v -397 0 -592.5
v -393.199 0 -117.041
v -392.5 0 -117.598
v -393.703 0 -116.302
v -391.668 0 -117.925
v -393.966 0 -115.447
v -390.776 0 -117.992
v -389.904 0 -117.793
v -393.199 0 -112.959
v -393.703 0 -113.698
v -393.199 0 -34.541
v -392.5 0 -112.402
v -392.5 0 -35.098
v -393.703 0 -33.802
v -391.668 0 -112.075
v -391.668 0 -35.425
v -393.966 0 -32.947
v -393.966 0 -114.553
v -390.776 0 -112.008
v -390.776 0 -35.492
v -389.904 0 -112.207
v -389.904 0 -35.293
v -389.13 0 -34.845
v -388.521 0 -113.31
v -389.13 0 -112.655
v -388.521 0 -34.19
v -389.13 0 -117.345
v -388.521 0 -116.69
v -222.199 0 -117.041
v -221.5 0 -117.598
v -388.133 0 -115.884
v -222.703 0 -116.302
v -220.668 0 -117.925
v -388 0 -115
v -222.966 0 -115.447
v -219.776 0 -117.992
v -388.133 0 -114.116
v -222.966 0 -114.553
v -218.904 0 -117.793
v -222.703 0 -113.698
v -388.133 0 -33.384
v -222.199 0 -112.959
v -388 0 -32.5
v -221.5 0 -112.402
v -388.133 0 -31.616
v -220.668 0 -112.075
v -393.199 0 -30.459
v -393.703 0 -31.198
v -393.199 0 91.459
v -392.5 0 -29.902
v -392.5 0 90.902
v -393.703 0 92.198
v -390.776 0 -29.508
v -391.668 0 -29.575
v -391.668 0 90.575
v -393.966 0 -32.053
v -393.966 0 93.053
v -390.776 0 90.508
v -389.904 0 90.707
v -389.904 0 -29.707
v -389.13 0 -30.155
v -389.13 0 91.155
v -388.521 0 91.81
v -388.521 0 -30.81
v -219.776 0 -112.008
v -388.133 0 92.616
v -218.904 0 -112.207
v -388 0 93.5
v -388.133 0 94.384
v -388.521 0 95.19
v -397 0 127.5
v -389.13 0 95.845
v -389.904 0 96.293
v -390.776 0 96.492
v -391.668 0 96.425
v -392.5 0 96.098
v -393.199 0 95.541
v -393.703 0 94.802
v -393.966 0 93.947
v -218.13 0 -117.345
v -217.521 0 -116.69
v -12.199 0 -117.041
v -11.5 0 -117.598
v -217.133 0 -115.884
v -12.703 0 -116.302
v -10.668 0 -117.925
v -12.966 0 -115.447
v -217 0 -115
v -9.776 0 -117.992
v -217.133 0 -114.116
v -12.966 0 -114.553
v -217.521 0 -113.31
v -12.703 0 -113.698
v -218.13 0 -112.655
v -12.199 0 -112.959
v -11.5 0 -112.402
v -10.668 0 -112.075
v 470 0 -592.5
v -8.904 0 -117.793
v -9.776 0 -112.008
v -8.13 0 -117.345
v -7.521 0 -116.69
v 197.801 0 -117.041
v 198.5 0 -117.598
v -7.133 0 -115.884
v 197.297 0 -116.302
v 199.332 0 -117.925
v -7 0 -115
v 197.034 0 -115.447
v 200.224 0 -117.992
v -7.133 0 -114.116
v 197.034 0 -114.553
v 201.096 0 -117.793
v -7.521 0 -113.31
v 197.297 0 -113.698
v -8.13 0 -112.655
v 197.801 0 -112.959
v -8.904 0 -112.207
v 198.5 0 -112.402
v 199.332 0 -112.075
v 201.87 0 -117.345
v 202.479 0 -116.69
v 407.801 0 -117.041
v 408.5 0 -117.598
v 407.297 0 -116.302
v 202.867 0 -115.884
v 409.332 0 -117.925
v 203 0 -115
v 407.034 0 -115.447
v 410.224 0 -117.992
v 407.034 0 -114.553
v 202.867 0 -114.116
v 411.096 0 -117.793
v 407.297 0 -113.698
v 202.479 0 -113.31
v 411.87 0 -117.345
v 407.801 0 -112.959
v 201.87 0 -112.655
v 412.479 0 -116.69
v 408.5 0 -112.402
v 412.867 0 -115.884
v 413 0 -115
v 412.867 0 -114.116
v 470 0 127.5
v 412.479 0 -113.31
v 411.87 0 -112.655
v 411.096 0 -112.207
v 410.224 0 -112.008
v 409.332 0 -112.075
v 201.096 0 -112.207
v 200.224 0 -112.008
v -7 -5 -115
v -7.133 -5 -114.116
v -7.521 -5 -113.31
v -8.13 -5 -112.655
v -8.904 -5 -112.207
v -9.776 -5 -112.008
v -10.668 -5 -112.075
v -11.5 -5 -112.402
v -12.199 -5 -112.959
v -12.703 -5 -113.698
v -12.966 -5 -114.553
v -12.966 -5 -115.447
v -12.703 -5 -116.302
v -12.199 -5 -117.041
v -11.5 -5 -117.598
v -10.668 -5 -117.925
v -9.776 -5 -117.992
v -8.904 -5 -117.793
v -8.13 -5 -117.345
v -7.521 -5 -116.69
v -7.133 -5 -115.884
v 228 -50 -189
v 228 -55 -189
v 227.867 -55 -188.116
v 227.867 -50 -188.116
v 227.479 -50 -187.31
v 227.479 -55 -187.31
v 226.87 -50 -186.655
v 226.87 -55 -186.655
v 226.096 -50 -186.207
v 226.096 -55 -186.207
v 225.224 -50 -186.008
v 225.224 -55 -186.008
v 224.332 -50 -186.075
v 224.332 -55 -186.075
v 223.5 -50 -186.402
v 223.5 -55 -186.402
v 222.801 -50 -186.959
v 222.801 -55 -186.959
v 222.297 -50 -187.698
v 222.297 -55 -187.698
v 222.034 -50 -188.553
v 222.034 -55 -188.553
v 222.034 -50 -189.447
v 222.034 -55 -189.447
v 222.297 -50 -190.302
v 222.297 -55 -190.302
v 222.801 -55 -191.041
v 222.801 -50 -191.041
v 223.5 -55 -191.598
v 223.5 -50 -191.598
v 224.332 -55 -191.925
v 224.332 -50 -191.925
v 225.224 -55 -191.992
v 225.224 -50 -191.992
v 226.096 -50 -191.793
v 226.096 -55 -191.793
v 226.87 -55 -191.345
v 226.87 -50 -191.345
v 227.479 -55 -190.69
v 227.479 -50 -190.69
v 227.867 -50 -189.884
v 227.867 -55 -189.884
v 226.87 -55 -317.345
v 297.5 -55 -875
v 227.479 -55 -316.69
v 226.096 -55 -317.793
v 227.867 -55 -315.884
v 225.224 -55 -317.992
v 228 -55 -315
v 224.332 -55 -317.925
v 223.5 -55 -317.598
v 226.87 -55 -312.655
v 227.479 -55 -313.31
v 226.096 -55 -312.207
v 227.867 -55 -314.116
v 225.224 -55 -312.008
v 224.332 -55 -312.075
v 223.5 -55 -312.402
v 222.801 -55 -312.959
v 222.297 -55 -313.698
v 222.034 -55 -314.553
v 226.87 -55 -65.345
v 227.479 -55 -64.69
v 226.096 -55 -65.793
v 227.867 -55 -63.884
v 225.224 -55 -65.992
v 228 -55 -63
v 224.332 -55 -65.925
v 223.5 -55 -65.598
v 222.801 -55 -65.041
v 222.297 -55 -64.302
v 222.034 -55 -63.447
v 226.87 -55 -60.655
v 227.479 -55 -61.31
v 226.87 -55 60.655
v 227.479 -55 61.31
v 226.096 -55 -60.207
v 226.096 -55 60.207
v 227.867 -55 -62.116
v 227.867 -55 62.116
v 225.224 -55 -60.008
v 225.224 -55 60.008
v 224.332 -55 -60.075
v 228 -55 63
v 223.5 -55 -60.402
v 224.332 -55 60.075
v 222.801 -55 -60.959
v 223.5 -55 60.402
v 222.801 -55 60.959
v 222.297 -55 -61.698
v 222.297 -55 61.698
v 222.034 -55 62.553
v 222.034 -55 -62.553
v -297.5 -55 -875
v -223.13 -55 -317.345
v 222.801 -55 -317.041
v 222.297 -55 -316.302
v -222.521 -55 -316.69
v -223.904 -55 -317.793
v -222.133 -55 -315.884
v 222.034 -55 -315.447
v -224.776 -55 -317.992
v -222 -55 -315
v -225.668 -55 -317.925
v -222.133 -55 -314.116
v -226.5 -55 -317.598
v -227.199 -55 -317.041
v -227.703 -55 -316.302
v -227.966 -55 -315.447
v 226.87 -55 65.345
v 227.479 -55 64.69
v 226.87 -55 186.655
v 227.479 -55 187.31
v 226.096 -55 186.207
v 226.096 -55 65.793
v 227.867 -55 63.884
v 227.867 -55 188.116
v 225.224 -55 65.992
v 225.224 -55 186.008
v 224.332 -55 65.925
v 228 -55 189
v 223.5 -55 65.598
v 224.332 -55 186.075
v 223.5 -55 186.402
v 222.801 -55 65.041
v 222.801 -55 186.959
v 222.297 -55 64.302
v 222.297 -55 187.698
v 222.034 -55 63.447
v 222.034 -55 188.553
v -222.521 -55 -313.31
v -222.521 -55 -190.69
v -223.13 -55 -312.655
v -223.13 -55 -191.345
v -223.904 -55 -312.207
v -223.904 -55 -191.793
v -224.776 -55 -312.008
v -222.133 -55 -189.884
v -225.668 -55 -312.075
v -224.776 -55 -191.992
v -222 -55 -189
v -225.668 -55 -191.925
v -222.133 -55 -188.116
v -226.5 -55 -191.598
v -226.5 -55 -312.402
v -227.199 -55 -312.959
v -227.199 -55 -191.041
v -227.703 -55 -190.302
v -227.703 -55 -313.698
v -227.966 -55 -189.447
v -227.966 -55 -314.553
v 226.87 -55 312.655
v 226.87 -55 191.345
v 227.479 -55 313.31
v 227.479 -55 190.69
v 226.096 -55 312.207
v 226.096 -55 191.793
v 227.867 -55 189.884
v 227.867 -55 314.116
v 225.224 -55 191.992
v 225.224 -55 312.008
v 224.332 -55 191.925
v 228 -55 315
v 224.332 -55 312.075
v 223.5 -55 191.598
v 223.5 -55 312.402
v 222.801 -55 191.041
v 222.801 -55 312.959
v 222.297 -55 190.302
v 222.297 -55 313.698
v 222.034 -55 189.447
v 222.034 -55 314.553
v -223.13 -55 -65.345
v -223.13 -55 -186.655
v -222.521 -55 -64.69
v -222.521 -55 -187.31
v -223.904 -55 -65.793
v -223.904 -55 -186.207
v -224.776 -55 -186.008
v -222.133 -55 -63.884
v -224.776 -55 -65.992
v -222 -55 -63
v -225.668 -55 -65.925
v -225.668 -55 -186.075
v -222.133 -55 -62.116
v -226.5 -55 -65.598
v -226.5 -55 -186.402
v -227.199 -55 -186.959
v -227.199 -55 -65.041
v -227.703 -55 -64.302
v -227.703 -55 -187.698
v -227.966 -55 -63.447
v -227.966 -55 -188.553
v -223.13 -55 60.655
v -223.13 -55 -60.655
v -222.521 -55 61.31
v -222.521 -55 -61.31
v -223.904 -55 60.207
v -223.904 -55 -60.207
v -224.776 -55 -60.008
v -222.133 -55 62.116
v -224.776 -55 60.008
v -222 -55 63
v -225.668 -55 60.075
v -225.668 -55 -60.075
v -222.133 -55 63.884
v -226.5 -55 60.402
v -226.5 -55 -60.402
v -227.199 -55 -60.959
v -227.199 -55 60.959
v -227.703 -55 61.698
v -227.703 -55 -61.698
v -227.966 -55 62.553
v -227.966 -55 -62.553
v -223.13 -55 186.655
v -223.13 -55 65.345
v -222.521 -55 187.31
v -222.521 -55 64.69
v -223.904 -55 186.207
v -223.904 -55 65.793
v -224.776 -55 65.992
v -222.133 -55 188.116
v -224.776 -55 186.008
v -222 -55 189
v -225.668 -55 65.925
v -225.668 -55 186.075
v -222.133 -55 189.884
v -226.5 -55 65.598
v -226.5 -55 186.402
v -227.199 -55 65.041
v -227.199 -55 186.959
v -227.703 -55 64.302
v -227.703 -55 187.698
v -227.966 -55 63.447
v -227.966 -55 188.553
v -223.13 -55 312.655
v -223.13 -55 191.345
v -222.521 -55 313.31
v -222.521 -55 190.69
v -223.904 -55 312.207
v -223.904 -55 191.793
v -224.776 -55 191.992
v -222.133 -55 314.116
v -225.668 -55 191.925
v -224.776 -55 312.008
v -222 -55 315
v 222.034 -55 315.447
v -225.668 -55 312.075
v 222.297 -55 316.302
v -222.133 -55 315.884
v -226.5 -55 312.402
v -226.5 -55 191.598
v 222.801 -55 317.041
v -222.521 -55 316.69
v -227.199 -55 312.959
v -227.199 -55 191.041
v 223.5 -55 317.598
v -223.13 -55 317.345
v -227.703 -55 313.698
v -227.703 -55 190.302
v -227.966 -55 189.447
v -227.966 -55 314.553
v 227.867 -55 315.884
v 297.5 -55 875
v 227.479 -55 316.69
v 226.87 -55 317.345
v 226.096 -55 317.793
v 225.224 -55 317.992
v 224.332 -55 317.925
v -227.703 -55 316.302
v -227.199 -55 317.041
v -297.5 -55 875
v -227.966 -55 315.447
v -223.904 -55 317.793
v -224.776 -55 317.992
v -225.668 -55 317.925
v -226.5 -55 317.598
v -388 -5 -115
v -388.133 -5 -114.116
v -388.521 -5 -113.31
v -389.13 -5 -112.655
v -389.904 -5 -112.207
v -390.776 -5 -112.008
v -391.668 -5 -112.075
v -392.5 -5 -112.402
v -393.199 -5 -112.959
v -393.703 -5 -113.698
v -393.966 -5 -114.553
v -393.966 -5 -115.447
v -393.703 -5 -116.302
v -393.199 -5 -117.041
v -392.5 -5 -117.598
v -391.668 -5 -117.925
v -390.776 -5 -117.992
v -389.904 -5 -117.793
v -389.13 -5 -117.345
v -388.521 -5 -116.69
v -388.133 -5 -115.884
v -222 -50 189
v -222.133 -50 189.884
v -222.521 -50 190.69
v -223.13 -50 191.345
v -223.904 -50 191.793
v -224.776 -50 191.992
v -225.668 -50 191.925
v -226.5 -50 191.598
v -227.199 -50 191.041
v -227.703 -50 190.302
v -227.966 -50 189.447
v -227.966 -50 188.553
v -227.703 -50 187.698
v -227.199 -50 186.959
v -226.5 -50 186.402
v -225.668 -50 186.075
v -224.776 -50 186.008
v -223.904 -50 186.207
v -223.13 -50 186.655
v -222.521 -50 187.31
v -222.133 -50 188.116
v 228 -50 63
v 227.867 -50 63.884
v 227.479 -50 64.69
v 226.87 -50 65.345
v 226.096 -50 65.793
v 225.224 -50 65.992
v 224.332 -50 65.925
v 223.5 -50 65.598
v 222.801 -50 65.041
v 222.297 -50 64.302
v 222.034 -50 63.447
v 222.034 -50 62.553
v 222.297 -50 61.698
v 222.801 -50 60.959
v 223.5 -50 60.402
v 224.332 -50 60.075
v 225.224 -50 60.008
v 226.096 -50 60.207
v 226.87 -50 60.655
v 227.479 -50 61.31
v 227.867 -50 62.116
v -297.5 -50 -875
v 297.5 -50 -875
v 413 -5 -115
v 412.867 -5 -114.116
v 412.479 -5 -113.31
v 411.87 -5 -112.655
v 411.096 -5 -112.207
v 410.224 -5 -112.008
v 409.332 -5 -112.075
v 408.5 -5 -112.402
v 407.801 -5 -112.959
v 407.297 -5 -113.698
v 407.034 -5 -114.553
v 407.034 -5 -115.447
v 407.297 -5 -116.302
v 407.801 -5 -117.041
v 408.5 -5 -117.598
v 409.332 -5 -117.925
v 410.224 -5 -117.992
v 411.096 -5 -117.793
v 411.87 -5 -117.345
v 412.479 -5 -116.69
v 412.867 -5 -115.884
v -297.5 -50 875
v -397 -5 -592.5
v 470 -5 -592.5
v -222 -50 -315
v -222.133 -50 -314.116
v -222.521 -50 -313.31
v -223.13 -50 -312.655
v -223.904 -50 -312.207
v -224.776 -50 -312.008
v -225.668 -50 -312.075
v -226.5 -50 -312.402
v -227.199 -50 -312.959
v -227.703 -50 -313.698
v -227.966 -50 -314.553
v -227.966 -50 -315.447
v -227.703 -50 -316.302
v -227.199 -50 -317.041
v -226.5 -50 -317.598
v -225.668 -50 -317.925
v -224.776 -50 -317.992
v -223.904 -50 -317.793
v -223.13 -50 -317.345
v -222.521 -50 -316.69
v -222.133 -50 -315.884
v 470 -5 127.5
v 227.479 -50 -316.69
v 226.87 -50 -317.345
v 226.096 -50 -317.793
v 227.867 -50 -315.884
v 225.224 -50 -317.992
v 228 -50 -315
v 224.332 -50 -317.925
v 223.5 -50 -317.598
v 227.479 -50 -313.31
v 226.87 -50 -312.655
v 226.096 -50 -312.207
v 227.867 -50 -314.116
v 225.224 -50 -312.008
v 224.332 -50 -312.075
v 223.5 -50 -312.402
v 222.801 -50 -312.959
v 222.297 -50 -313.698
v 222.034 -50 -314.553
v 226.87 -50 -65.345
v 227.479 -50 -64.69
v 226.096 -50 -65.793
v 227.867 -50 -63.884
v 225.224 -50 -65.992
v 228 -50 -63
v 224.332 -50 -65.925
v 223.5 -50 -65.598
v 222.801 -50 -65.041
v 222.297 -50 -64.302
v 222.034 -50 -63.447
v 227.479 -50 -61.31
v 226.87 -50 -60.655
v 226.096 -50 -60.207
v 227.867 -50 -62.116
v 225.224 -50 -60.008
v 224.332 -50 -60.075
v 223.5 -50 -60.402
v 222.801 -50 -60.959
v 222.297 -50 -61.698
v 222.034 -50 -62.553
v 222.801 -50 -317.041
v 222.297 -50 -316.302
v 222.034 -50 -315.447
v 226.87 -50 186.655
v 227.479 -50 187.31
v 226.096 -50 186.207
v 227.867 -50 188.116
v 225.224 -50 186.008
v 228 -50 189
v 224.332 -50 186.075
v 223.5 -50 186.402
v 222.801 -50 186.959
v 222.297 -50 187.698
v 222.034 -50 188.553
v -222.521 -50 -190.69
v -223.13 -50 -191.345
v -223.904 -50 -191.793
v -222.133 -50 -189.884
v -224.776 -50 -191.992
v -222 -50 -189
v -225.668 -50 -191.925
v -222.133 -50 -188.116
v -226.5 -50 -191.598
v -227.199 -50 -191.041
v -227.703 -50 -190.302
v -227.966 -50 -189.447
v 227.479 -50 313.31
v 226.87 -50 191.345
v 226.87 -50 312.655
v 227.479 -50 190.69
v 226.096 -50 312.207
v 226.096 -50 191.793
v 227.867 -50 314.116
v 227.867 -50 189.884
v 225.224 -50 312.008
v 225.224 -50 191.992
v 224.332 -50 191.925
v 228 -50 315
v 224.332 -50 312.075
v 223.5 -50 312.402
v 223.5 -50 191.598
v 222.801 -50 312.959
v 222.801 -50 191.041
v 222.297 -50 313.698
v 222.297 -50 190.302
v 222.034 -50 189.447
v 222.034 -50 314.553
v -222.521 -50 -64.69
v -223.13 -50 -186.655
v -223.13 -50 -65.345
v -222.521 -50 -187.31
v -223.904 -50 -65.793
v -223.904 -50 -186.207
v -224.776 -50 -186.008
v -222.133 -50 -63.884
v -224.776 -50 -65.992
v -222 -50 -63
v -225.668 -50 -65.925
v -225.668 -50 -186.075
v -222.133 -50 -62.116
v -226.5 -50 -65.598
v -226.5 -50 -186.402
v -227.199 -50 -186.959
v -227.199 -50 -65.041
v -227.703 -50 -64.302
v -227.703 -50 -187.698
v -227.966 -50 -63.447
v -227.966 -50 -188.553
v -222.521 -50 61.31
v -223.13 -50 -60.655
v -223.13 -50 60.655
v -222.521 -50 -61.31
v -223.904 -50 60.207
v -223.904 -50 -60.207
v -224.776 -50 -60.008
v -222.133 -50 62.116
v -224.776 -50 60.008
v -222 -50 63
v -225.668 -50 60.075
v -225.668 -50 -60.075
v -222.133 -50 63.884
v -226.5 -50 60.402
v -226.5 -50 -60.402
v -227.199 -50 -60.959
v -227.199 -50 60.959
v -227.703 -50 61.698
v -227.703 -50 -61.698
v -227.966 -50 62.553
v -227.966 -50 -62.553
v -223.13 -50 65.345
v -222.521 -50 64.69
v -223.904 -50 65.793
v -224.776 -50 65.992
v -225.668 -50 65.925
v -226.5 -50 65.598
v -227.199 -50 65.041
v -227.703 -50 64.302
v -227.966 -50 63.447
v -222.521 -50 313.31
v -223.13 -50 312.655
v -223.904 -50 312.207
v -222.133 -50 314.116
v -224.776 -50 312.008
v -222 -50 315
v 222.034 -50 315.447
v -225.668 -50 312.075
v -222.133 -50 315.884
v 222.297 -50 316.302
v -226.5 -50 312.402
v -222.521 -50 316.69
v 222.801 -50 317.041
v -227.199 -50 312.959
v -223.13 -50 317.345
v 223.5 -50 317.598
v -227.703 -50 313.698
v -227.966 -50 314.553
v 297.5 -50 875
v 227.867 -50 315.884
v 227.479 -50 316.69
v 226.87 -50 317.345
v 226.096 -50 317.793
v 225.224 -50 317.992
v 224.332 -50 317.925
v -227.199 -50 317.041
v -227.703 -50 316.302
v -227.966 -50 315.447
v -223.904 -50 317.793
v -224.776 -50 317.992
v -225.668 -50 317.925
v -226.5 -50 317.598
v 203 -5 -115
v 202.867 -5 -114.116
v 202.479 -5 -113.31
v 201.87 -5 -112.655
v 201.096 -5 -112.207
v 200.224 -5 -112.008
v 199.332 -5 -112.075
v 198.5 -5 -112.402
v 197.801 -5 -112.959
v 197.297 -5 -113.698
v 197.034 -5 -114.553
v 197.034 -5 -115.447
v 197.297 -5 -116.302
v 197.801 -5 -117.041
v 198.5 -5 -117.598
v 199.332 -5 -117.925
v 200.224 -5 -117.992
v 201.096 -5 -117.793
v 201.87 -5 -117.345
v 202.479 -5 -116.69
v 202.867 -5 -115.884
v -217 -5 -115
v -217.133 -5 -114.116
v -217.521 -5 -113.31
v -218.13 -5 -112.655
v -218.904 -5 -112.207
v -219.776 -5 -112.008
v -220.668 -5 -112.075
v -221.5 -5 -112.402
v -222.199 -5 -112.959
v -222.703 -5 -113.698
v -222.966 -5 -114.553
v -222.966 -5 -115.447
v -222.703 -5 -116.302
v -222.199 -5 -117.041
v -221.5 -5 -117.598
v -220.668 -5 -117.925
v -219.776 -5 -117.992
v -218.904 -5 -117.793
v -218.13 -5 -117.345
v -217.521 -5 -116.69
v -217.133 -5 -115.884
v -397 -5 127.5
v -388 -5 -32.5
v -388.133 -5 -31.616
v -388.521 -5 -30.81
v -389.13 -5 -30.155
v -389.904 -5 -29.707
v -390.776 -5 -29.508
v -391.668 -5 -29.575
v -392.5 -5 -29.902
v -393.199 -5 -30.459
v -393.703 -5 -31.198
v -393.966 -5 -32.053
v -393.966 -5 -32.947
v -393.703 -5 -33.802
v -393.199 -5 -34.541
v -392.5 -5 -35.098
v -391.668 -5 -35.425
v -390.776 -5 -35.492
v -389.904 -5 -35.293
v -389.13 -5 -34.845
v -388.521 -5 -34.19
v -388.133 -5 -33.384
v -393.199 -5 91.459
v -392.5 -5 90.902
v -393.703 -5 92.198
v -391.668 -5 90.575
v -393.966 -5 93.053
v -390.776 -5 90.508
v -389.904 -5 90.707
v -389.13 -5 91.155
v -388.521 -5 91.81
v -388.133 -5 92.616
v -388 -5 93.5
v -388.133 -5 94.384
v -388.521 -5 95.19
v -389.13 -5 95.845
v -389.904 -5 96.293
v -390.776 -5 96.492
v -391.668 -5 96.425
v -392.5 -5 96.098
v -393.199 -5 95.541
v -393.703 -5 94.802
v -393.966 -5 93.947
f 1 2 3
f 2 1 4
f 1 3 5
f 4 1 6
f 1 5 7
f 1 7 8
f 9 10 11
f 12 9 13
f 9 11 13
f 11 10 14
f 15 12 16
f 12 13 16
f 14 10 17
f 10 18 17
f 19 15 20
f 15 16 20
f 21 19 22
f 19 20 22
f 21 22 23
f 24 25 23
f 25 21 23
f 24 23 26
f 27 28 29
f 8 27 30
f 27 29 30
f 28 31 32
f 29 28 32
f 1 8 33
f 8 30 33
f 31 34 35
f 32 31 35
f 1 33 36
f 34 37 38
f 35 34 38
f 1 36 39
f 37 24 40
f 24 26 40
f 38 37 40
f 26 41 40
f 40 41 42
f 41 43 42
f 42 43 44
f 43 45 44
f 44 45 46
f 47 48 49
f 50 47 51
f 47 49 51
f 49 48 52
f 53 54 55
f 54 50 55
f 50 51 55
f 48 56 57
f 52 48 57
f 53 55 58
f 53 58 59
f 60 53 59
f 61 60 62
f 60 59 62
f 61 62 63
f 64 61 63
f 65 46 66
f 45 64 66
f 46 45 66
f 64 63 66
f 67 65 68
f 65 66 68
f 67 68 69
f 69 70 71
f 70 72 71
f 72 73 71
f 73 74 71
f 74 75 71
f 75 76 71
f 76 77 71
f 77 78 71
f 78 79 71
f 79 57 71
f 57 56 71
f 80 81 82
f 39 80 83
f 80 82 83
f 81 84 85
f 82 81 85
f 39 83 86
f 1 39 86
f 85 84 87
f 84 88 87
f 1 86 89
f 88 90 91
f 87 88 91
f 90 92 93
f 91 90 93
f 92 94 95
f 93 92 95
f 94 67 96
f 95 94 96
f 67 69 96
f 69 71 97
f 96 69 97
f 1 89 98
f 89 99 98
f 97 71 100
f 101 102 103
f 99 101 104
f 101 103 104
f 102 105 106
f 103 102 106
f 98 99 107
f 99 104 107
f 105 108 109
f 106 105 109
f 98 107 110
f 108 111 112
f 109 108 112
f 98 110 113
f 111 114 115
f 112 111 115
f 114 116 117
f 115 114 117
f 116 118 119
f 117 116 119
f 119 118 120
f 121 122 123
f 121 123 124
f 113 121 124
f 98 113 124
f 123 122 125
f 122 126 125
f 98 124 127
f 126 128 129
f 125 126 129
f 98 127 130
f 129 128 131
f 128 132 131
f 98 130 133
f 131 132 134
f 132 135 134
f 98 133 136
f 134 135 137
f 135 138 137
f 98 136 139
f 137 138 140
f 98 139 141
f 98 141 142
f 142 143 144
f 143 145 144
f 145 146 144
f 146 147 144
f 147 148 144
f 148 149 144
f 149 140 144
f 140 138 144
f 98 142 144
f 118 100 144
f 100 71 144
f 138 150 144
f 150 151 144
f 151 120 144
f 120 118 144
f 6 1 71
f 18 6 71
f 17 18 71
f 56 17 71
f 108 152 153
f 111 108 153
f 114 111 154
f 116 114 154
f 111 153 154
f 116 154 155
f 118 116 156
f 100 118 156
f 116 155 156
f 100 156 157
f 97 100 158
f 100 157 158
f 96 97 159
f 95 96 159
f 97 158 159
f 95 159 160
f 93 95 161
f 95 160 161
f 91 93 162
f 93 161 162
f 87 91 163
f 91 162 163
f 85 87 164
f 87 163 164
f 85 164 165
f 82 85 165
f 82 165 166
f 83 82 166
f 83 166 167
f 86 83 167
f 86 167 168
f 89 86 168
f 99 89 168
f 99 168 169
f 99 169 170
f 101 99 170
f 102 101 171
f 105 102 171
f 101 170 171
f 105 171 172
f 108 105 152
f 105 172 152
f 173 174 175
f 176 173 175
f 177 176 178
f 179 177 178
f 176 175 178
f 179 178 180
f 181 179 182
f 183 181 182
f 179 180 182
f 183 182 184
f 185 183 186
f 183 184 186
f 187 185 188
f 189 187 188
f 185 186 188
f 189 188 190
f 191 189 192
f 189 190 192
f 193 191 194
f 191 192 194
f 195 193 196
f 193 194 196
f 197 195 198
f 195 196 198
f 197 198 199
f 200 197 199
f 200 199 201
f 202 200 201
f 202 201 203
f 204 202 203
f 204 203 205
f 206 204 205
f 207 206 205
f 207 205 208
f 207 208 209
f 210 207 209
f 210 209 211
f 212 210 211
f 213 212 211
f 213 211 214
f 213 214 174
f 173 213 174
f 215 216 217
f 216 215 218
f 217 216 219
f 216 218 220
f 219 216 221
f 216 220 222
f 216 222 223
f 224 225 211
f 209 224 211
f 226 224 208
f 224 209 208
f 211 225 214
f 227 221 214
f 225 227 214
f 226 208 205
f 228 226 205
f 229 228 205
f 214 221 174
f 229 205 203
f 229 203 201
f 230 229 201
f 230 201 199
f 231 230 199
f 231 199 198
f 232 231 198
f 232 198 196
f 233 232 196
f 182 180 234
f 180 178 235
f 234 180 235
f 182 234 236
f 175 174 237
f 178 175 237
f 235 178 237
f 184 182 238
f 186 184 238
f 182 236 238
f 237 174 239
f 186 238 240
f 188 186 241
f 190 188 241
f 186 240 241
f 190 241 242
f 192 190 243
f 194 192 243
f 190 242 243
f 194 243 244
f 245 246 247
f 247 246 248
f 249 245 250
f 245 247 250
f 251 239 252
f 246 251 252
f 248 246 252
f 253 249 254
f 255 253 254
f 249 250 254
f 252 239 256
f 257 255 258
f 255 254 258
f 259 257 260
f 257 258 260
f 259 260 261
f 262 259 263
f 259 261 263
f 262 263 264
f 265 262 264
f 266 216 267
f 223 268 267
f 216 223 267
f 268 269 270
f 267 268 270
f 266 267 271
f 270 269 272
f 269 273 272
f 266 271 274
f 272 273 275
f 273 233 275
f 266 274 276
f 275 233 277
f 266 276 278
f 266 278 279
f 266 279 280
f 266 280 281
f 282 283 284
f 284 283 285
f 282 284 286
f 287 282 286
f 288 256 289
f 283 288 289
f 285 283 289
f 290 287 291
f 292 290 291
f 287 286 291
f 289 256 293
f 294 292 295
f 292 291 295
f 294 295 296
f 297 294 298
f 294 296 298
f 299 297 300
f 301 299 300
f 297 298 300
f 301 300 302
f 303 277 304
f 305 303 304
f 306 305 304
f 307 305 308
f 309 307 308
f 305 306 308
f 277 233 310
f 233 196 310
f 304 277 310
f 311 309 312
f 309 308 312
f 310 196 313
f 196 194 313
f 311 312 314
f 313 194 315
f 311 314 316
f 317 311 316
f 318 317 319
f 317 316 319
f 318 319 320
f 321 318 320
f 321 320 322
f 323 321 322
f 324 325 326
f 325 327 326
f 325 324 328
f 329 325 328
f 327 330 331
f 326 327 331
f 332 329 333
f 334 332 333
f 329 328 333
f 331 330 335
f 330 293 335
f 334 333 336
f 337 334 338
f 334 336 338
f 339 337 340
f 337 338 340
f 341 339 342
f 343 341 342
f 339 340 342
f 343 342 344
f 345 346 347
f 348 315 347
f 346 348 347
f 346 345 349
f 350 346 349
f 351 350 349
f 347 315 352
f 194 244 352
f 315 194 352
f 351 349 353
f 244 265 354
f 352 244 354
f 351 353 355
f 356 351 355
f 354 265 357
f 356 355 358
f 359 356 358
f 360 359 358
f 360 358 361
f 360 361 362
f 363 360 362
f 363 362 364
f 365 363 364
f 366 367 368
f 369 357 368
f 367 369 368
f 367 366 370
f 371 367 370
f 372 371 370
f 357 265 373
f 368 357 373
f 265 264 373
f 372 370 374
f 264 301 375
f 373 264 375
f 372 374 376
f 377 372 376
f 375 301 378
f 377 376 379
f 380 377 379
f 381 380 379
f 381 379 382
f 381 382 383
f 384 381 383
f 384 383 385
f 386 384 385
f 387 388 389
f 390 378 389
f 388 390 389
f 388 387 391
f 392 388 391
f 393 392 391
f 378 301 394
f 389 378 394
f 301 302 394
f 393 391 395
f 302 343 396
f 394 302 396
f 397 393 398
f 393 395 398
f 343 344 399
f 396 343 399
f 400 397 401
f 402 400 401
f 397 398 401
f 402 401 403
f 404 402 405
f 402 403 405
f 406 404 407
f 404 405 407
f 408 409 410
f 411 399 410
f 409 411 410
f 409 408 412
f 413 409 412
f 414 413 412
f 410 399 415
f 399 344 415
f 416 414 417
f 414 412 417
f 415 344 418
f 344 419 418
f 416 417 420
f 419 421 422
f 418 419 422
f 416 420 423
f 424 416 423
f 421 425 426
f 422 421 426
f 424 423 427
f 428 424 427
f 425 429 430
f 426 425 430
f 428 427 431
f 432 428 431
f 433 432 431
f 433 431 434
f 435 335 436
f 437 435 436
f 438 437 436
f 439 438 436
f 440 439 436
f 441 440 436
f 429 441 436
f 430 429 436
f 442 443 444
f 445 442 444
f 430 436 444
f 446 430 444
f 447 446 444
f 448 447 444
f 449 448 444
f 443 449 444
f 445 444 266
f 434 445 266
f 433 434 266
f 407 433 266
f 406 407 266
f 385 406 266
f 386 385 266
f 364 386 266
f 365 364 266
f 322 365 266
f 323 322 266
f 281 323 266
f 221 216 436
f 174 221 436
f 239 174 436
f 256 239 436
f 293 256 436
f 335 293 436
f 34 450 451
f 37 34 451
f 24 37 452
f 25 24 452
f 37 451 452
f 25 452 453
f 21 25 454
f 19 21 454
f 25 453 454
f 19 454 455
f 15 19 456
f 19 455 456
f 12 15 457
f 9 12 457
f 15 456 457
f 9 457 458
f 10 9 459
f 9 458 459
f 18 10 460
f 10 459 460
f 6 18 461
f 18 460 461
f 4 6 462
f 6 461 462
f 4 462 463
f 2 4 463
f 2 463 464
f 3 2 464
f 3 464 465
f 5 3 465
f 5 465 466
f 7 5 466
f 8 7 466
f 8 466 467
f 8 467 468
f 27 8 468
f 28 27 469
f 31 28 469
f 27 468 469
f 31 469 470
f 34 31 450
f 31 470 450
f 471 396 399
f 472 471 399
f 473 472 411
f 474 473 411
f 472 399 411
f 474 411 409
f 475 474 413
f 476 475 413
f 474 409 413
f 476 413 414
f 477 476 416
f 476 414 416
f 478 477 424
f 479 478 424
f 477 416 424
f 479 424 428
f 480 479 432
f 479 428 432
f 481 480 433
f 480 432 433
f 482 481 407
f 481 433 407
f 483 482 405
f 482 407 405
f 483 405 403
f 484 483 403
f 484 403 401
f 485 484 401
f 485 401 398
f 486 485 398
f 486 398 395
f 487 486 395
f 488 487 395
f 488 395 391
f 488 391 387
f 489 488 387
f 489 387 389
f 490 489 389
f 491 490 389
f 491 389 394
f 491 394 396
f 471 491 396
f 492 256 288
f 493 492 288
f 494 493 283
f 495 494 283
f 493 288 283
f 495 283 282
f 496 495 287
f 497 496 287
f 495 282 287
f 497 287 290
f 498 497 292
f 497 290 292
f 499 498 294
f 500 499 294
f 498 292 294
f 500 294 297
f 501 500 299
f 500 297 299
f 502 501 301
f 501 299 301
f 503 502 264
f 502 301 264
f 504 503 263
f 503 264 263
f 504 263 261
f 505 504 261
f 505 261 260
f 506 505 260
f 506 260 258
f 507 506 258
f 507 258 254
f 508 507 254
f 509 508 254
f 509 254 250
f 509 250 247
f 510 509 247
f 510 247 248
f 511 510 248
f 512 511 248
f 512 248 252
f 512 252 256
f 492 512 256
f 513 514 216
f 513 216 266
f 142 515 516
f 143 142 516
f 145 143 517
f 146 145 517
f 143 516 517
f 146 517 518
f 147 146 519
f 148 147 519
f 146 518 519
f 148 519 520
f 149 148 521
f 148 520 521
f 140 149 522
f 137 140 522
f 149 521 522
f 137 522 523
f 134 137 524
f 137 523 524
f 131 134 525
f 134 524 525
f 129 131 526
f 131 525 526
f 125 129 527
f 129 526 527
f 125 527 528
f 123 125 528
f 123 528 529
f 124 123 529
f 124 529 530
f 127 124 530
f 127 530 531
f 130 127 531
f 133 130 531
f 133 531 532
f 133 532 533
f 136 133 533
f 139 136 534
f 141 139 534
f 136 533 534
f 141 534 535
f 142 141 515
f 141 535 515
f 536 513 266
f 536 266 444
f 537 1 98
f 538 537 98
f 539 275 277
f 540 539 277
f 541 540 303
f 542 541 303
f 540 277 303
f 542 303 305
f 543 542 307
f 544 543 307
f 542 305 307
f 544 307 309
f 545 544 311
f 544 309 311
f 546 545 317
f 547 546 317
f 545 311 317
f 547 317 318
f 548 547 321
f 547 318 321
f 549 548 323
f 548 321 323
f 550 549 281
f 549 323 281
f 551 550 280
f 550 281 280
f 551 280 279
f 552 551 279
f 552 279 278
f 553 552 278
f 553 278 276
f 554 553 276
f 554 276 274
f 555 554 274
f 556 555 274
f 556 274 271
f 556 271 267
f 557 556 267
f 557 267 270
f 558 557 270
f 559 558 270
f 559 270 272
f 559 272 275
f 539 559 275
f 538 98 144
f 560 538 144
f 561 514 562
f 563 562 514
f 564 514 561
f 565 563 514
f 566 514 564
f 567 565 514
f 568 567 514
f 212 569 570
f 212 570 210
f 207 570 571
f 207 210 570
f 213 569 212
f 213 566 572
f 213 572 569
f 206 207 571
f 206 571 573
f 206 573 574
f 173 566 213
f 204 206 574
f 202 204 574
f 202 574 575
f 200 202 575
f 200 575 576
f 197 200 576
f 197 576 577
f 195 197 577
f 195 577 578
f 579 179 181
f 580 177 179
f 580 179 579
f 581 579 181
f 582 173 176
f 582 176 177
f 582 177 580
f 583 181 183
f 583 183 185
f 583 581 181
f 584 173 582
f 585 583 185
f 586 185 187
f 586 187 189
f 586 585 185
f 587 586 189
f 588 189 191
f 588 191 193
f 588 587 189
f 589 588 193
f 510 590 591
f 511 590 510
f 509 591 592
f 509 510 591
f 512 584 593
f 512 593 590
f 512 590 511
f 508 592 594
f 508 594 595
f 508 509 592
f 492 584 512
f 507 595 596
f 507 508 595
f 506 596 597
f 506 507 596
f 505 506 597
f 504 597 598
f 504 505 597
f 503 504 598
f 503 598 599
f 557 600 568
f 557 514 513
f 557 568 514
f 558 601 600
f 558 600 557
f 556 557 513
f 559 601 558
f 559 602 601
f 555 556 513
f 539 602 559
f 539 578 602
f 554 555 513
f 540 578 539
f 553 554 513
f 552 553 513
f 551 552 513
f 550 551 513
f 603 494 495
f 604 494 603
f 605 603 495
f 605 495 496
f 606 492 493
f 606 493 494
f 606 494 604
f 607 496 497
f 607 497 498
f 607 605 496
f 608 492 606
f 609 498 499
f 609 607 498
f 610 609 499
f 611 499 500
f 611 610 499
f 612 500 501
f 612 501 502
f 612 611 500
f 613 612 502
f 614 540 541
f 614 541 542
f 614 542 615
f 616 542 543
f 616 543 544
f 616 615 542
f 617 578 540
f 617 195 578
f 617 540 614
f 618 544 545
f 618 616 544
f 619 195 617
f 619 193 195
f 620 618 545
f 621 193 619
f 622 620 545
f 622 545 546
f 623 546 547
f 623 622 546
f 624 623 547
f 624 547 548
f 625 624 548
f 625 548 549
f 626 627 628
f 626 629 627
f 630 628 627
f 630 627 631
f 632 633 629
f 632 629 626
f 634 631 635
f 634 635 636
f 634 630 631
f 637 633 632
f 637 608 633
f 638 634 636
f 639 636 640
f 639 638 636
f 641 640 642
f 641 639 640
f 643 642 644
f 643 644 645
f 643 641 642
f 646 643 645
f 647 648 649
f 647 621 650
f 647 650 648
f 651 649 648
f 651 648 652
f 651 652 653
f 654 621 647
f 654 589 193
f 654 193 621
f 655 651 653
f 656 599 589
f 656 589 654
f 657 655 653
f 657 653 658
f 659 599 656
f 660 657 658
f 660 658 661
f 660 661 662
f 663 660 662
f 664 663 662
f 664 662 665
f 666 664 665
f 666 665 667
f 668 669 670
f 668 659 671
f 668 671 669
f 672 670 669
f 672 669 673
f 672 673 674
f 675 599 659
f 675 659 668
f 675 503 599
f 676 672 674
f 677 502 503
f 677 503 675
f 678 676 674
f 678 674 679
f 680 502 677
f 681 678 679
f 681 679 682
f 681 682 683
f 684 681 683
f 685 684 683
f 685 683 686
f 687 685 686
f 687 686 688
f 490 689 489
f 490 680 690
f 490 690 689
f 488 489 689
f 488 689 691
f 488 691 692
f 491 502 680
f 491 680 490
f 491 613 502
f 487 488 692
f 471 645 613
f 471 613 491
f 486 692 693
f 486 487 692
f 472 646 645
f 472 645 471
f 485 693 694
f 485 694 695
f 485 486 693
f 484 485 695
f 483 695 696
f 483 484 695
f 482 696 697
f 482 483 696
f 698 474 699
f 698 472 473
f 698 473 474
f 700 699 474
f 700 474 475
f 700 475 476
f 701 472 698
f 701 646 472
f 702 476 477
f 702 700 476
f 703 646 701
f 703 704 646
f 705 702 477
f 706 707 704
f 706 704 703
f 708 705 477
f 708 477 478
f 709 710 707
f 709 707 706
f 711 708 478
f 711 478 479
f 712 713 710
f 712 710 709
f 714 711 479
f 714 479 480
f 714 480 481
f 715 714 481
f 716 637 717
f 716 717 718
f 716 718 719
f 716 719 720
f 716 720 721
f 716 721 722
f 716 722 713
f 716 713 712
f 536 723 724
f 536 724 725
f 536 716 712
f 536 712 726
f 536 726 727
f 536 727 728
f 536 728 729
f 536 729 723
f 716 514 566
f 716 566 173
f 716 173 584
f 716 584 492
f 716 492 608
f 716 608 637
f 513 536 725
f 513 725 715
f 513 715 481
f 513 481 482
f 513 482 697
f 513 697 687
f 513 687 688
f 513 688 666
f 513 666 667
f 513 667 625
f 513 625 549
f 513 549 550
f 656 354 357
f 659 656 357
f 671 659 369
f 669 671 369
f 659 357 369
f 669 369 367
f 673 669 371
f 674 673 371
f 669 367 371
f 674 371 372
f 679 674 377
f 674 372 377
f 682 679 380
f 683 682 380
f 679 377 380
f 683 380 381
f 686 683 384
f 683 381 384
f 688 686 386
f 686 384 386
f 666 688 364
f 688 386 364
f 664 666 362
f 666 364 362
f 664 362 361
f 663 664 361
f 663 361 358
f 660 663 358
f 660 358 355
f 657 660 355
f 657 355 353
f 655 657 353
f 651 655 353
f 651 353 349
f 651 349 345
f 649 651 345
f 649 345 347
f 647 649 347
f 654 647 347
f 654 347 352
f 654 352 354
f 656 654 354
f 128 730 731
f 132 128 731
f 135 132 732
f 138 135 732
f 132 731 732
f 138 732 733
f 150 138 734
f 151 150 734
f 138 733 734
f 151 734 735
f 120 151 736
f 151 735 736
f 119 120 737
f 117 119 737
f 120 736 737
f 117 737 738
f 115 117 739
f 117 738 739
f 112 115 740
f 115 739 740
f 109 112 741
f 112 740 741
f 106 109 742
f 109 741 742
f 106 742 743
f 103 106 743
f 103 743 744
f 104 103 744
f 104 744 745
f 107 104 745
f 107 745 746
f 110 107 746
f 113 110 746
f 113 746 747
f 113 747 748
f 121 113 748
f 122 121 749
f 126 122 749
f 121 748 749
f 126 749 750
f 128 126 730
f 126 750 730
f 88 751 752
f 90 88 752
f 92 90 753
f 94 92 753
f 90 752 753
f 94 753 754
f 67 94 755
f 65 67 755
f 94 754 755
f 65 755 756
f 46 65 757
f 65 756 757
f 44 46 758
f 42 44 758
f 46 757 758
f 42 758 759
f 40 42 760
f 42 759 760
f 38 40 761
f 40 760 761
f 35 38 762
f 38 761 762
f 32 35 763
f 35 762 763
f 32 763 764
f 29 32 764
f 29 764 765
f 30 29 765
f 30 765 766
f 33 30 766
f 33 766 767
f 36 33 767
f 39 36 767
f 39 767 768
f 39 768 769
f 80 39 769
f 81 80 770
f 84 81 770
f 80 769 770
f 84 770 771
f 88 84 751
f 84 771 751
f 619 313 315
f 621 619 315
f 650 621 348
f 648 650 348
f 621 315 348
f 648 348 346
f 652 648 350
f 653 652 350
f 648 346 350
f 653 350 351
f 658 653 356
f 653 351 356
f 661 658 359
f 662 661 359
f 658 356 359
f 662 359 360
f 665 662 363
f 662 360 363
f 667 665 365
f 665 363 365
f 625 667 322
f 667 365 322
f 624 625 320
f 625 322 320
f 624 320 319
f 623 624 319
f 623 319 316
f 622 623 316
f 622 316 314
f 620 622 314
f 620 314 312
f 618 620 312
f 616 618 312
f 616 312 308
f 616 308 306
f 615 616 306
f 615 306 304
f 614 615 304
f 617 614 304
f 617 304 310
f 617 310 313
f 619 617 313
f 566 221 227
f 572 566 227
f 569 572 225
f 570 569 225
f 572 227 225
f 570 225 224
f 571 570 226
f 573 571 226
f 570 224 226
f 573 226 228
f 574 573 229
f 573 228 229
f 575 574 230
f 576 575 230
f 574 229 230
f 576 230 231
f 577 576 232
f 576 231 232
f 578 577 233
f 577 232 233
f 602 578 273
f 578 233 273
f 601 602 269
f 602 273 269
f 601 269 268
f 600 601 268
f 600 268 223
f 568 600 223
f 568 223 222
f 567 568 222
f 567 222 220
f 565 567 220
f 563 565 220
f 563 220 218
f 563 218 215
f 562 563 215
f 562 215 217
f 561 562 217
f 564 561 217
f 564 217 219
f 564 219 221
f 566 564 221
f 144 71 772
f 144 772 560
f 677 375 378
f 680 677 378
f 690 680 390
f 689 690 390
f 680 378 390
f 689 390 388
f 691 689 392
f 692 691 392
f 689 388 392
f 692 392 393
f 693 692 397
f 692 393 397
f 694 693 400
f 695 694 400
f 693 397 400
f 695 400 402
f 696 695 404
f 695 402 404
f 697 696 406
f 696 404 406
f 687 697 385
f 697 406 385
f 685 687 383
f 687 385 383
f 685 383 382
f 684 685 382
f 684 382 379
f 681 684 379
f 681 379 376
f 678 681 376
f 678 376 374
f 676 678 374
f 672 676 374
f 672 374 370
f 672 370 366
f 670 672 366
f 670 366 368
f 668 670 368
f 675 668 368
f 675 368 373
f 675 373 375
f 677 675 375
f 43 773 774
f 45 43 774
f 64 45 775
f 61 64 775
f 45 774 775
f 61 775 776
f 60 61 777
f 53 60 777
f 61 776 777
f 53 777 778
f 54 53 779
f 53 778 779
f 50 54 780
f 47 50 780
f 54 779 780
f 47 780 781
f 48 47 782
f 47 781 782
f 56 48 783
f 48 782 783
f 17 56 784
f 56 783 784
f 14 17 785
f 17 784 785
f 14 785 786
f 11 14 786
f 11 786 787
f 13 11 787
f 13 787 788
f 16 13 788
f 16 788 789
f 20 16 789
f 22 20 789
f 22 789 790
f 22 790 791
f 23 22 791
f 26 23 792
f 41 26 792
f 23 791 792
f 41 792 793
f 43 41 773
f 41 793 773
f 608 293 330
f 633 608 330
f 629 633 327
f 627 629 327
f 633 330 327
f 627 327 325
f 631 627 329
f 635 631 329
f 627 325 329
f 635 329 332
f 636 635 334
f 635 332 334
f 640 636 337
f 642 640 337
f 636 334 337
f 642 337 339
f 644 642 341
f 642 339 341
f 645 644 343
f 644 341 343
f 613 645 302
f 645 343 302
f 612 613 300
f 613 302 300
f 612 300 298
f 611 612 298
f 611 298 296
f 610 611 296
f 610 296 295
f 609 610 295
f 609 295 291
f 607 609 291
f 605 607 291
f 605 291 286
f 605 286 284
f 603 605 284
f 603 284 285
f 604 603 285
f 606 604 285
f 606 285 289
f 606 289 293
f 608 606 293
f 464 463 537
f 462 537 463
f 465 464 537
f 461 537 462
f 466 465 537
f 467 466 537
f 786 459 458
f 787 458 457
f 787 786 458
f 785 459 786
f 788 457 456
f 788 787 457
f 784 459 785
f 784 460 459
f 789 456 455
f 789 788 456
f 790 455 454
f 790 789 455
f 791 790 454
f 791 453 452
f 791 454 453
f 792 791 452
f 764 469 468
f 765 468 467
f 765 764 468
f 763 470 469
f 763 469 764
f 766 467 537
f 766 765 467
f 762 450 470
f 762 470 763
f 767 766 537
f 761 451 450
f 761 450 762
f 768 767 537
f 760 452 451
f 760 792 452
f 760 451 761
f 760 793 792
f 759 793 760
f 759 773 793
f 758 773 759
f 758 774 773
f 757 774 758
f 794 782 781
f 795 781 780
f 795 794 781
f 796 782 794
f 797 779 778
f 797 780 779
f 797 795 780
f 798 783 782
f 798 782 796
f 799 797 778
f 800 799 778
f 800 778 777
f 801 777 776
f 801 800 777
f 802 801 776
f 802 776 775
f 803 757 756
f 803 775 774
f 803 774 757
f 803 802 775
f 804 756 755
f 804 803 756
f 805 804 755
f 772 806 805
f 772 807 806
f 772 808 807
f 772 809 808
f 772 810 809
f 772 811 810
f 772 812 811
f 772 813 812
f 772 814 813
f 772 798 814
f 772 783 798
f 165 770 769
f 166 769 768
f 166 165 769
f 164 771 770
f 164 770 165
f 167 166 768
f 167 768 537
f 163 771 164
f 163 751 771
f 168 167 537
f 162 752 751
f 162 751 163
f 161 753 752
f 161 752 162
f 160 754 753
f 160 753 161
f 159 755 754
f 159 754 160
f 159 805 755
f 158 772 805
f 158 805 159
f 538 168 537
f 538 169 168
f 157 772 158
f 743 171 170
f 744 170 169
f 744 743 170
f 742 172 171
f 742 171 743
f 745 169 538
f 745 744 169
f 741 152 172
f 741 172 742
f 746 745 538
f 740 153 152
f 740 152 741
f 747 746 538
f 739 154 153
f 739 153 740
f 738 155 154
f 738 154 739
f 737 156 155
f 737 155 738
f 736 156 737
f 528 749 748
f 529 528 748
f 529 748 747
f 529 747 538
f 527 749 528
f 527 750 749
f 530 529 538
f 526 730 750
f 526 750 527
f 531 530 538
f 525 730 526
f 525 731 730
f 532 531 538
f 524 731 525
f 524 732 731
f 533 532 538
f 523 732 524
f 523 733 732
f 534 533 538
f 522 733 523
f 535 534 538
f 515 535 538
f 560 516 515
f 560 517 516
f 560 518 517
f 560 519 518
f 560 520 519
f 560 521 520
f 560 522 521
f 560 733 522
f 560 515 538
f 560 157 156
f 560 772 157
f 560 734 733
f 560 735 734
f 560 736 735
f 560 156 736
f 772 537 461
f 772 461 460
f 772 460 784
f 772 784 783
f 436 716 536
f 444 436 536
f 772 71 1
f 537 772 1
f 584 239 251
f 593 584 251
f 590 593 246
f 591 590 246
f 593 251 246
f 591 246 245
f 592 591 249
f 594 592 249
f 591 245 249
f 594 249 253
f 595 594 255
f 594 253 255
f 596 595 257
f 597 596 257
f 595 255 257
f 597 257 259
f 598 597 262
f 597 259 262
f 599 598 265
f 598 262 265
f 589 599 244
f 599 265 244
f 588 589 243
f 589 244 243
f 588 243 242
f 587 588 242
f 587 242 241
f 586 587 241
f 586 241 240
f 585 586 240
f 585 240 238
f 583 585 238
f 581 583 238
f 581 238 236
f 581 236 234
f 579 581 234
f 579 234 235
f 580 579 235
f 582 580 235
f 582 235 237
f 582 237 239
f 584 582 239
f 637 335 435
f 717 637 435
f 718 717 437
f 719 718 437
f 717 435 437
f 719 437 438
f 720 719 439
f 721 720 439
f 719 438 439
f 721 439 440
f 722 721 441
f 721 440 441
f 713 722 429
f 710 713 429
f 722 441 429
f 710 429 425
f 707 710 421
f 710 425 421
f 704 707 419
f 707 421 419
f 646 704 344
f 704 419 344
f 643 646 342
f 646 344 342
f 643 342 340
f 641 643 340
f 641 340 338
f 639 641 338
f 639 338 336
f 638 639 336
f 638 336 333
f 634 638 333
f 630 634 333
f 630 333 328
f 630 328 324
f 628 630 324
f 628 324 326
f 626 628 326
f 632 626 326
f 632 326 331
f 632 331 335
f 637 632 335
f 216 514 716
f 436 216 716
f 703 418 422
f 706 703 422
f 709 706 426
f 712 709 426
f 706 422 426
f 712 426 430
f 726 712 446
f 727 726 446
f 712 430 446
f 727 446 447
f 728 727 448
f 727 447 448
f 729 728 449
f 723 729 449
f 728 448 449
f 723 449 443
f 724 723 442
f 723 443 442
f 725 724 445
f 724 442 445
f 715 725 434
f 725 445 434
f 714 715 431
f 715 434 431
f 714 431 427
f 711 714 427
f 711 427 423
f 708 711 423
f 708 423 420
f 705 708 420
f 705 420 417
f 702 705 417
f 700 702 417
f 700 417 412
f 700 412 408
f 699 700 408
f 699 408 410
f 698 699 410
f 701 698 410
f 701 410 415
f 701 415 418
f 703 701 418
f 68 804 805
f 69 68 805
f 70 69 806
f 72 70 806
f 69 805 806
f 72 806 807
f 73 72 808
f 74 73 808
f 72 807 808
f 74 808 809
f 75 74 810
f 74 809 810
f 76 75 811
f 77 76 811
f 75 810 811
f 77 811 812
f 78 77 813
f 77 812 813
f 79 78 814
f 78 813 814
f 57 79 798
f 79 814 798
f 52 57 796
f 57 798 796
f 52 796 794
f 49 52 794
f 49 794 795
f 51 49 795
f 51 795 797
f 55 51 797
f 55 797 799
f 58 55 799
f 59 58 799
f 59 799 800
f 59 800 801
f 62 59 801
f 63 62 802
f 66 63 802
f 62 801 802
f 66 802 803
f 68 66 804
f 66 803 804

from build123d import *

# Parameters (mm, degrees)
F0_W      = 867
F0_H      = 255
F0_H_2    = 465
F1_DEPTH  = 5
F3_W      = 595
F3_H      = 820
F4_DEPTH  = 5
F5_R      = 3
F6_DEPTH  = 5
F7_R      = 3
F8_DEPTH  = 25
F9_W      = 595
F9_H      = 465
F10_DEPTH = 5


with BuildPart() as f1:
    # F0 (on Front) → F1 (new body)
    with BuildSketch(Plane.XZ):
        with Locations((36.5, 0)):
            Rectangle(F0_W, F0_H)
        with Locations((36.5, -360)):
            Rectangle(F0_W, F0_H_2)
    extrude(amount=F1_DEPTH)

    # F5 (on face) → F6 (cut)
    with BuildSketch(Plane.XZ.offset(5)):
        with Locations((-220, -115)):
            Circle(F5_R)
        with Locations((-10, -115)):
            Circle(F5_R)
        with Locations((200, -115)):
            Circle(F5_R)
        with Locations((410, -115)):
            Circle(F5_R)
        with Locations((-391, 93.5)):
            Circle(F5_R)
        with Locations((-391, -32.5)):
            Circle(F5_R)
        with Locations((-391, -115)):
            Circle(F5_R)
    extrude(amount=-F6_DEPTH, mode=Mode.SUBTRACT)


with BuildPart() as f4:
    # F3 (on offset) → F4 (new body)
    with BuildSketch(Plane.XZ.offset(50)):
        Rectangle(F3_W, F3_H)
    extrude(amount=F4_DEPTH)

    # F7 (on face) → F8 (cut)
    with BuildSketch(Plane.XZ.offset(55)):
        with Locations((-225, -315)):
            Circle(F7_R)
        with Locations((-225, -189)):
            Circle(F7_R)
        with Locations((-225, -63)):
            Circle(F7_R)
        with Locations((-225, 63)):
            Circle(F7_R)
        with Locations((-225, 189)):
            Circle(F7_R)
        with Locations((-225, 315)):
            Circle(F7_R)
        with Locations((225, 315)):
            Circle(F7_R)
        with Locations((225, 189)):
            Circle(F7_R)
        with Locations((225, 63)):
            Circle(F7_R)
        with Locations((225, -63)):
            Circle(F7_R)
        with Locations((225, -189)):
            Circle(F7_R)
        with Locations((225, -315)):
            Circle(F7_R)
    extrude(amount=-F8_DEPTH, mode=Mode.SUBTRACT)

    # F9 (on face) → F10 (join)
    with BuildSketch(Plane(origin=(0, -50, 0), x_dir=(-1, 0, 0), z_dir=(0, 1, 0))):
        with Locations((0, -642.5)):
            Rectangle(F9_W, F9_H)
        with Locations((0, 642.5)):
            Rectangle(F9_W, F9_H)
    extrude(amount=-F10_DEPTH)


solid = Compound([f1.part, f4.part])
